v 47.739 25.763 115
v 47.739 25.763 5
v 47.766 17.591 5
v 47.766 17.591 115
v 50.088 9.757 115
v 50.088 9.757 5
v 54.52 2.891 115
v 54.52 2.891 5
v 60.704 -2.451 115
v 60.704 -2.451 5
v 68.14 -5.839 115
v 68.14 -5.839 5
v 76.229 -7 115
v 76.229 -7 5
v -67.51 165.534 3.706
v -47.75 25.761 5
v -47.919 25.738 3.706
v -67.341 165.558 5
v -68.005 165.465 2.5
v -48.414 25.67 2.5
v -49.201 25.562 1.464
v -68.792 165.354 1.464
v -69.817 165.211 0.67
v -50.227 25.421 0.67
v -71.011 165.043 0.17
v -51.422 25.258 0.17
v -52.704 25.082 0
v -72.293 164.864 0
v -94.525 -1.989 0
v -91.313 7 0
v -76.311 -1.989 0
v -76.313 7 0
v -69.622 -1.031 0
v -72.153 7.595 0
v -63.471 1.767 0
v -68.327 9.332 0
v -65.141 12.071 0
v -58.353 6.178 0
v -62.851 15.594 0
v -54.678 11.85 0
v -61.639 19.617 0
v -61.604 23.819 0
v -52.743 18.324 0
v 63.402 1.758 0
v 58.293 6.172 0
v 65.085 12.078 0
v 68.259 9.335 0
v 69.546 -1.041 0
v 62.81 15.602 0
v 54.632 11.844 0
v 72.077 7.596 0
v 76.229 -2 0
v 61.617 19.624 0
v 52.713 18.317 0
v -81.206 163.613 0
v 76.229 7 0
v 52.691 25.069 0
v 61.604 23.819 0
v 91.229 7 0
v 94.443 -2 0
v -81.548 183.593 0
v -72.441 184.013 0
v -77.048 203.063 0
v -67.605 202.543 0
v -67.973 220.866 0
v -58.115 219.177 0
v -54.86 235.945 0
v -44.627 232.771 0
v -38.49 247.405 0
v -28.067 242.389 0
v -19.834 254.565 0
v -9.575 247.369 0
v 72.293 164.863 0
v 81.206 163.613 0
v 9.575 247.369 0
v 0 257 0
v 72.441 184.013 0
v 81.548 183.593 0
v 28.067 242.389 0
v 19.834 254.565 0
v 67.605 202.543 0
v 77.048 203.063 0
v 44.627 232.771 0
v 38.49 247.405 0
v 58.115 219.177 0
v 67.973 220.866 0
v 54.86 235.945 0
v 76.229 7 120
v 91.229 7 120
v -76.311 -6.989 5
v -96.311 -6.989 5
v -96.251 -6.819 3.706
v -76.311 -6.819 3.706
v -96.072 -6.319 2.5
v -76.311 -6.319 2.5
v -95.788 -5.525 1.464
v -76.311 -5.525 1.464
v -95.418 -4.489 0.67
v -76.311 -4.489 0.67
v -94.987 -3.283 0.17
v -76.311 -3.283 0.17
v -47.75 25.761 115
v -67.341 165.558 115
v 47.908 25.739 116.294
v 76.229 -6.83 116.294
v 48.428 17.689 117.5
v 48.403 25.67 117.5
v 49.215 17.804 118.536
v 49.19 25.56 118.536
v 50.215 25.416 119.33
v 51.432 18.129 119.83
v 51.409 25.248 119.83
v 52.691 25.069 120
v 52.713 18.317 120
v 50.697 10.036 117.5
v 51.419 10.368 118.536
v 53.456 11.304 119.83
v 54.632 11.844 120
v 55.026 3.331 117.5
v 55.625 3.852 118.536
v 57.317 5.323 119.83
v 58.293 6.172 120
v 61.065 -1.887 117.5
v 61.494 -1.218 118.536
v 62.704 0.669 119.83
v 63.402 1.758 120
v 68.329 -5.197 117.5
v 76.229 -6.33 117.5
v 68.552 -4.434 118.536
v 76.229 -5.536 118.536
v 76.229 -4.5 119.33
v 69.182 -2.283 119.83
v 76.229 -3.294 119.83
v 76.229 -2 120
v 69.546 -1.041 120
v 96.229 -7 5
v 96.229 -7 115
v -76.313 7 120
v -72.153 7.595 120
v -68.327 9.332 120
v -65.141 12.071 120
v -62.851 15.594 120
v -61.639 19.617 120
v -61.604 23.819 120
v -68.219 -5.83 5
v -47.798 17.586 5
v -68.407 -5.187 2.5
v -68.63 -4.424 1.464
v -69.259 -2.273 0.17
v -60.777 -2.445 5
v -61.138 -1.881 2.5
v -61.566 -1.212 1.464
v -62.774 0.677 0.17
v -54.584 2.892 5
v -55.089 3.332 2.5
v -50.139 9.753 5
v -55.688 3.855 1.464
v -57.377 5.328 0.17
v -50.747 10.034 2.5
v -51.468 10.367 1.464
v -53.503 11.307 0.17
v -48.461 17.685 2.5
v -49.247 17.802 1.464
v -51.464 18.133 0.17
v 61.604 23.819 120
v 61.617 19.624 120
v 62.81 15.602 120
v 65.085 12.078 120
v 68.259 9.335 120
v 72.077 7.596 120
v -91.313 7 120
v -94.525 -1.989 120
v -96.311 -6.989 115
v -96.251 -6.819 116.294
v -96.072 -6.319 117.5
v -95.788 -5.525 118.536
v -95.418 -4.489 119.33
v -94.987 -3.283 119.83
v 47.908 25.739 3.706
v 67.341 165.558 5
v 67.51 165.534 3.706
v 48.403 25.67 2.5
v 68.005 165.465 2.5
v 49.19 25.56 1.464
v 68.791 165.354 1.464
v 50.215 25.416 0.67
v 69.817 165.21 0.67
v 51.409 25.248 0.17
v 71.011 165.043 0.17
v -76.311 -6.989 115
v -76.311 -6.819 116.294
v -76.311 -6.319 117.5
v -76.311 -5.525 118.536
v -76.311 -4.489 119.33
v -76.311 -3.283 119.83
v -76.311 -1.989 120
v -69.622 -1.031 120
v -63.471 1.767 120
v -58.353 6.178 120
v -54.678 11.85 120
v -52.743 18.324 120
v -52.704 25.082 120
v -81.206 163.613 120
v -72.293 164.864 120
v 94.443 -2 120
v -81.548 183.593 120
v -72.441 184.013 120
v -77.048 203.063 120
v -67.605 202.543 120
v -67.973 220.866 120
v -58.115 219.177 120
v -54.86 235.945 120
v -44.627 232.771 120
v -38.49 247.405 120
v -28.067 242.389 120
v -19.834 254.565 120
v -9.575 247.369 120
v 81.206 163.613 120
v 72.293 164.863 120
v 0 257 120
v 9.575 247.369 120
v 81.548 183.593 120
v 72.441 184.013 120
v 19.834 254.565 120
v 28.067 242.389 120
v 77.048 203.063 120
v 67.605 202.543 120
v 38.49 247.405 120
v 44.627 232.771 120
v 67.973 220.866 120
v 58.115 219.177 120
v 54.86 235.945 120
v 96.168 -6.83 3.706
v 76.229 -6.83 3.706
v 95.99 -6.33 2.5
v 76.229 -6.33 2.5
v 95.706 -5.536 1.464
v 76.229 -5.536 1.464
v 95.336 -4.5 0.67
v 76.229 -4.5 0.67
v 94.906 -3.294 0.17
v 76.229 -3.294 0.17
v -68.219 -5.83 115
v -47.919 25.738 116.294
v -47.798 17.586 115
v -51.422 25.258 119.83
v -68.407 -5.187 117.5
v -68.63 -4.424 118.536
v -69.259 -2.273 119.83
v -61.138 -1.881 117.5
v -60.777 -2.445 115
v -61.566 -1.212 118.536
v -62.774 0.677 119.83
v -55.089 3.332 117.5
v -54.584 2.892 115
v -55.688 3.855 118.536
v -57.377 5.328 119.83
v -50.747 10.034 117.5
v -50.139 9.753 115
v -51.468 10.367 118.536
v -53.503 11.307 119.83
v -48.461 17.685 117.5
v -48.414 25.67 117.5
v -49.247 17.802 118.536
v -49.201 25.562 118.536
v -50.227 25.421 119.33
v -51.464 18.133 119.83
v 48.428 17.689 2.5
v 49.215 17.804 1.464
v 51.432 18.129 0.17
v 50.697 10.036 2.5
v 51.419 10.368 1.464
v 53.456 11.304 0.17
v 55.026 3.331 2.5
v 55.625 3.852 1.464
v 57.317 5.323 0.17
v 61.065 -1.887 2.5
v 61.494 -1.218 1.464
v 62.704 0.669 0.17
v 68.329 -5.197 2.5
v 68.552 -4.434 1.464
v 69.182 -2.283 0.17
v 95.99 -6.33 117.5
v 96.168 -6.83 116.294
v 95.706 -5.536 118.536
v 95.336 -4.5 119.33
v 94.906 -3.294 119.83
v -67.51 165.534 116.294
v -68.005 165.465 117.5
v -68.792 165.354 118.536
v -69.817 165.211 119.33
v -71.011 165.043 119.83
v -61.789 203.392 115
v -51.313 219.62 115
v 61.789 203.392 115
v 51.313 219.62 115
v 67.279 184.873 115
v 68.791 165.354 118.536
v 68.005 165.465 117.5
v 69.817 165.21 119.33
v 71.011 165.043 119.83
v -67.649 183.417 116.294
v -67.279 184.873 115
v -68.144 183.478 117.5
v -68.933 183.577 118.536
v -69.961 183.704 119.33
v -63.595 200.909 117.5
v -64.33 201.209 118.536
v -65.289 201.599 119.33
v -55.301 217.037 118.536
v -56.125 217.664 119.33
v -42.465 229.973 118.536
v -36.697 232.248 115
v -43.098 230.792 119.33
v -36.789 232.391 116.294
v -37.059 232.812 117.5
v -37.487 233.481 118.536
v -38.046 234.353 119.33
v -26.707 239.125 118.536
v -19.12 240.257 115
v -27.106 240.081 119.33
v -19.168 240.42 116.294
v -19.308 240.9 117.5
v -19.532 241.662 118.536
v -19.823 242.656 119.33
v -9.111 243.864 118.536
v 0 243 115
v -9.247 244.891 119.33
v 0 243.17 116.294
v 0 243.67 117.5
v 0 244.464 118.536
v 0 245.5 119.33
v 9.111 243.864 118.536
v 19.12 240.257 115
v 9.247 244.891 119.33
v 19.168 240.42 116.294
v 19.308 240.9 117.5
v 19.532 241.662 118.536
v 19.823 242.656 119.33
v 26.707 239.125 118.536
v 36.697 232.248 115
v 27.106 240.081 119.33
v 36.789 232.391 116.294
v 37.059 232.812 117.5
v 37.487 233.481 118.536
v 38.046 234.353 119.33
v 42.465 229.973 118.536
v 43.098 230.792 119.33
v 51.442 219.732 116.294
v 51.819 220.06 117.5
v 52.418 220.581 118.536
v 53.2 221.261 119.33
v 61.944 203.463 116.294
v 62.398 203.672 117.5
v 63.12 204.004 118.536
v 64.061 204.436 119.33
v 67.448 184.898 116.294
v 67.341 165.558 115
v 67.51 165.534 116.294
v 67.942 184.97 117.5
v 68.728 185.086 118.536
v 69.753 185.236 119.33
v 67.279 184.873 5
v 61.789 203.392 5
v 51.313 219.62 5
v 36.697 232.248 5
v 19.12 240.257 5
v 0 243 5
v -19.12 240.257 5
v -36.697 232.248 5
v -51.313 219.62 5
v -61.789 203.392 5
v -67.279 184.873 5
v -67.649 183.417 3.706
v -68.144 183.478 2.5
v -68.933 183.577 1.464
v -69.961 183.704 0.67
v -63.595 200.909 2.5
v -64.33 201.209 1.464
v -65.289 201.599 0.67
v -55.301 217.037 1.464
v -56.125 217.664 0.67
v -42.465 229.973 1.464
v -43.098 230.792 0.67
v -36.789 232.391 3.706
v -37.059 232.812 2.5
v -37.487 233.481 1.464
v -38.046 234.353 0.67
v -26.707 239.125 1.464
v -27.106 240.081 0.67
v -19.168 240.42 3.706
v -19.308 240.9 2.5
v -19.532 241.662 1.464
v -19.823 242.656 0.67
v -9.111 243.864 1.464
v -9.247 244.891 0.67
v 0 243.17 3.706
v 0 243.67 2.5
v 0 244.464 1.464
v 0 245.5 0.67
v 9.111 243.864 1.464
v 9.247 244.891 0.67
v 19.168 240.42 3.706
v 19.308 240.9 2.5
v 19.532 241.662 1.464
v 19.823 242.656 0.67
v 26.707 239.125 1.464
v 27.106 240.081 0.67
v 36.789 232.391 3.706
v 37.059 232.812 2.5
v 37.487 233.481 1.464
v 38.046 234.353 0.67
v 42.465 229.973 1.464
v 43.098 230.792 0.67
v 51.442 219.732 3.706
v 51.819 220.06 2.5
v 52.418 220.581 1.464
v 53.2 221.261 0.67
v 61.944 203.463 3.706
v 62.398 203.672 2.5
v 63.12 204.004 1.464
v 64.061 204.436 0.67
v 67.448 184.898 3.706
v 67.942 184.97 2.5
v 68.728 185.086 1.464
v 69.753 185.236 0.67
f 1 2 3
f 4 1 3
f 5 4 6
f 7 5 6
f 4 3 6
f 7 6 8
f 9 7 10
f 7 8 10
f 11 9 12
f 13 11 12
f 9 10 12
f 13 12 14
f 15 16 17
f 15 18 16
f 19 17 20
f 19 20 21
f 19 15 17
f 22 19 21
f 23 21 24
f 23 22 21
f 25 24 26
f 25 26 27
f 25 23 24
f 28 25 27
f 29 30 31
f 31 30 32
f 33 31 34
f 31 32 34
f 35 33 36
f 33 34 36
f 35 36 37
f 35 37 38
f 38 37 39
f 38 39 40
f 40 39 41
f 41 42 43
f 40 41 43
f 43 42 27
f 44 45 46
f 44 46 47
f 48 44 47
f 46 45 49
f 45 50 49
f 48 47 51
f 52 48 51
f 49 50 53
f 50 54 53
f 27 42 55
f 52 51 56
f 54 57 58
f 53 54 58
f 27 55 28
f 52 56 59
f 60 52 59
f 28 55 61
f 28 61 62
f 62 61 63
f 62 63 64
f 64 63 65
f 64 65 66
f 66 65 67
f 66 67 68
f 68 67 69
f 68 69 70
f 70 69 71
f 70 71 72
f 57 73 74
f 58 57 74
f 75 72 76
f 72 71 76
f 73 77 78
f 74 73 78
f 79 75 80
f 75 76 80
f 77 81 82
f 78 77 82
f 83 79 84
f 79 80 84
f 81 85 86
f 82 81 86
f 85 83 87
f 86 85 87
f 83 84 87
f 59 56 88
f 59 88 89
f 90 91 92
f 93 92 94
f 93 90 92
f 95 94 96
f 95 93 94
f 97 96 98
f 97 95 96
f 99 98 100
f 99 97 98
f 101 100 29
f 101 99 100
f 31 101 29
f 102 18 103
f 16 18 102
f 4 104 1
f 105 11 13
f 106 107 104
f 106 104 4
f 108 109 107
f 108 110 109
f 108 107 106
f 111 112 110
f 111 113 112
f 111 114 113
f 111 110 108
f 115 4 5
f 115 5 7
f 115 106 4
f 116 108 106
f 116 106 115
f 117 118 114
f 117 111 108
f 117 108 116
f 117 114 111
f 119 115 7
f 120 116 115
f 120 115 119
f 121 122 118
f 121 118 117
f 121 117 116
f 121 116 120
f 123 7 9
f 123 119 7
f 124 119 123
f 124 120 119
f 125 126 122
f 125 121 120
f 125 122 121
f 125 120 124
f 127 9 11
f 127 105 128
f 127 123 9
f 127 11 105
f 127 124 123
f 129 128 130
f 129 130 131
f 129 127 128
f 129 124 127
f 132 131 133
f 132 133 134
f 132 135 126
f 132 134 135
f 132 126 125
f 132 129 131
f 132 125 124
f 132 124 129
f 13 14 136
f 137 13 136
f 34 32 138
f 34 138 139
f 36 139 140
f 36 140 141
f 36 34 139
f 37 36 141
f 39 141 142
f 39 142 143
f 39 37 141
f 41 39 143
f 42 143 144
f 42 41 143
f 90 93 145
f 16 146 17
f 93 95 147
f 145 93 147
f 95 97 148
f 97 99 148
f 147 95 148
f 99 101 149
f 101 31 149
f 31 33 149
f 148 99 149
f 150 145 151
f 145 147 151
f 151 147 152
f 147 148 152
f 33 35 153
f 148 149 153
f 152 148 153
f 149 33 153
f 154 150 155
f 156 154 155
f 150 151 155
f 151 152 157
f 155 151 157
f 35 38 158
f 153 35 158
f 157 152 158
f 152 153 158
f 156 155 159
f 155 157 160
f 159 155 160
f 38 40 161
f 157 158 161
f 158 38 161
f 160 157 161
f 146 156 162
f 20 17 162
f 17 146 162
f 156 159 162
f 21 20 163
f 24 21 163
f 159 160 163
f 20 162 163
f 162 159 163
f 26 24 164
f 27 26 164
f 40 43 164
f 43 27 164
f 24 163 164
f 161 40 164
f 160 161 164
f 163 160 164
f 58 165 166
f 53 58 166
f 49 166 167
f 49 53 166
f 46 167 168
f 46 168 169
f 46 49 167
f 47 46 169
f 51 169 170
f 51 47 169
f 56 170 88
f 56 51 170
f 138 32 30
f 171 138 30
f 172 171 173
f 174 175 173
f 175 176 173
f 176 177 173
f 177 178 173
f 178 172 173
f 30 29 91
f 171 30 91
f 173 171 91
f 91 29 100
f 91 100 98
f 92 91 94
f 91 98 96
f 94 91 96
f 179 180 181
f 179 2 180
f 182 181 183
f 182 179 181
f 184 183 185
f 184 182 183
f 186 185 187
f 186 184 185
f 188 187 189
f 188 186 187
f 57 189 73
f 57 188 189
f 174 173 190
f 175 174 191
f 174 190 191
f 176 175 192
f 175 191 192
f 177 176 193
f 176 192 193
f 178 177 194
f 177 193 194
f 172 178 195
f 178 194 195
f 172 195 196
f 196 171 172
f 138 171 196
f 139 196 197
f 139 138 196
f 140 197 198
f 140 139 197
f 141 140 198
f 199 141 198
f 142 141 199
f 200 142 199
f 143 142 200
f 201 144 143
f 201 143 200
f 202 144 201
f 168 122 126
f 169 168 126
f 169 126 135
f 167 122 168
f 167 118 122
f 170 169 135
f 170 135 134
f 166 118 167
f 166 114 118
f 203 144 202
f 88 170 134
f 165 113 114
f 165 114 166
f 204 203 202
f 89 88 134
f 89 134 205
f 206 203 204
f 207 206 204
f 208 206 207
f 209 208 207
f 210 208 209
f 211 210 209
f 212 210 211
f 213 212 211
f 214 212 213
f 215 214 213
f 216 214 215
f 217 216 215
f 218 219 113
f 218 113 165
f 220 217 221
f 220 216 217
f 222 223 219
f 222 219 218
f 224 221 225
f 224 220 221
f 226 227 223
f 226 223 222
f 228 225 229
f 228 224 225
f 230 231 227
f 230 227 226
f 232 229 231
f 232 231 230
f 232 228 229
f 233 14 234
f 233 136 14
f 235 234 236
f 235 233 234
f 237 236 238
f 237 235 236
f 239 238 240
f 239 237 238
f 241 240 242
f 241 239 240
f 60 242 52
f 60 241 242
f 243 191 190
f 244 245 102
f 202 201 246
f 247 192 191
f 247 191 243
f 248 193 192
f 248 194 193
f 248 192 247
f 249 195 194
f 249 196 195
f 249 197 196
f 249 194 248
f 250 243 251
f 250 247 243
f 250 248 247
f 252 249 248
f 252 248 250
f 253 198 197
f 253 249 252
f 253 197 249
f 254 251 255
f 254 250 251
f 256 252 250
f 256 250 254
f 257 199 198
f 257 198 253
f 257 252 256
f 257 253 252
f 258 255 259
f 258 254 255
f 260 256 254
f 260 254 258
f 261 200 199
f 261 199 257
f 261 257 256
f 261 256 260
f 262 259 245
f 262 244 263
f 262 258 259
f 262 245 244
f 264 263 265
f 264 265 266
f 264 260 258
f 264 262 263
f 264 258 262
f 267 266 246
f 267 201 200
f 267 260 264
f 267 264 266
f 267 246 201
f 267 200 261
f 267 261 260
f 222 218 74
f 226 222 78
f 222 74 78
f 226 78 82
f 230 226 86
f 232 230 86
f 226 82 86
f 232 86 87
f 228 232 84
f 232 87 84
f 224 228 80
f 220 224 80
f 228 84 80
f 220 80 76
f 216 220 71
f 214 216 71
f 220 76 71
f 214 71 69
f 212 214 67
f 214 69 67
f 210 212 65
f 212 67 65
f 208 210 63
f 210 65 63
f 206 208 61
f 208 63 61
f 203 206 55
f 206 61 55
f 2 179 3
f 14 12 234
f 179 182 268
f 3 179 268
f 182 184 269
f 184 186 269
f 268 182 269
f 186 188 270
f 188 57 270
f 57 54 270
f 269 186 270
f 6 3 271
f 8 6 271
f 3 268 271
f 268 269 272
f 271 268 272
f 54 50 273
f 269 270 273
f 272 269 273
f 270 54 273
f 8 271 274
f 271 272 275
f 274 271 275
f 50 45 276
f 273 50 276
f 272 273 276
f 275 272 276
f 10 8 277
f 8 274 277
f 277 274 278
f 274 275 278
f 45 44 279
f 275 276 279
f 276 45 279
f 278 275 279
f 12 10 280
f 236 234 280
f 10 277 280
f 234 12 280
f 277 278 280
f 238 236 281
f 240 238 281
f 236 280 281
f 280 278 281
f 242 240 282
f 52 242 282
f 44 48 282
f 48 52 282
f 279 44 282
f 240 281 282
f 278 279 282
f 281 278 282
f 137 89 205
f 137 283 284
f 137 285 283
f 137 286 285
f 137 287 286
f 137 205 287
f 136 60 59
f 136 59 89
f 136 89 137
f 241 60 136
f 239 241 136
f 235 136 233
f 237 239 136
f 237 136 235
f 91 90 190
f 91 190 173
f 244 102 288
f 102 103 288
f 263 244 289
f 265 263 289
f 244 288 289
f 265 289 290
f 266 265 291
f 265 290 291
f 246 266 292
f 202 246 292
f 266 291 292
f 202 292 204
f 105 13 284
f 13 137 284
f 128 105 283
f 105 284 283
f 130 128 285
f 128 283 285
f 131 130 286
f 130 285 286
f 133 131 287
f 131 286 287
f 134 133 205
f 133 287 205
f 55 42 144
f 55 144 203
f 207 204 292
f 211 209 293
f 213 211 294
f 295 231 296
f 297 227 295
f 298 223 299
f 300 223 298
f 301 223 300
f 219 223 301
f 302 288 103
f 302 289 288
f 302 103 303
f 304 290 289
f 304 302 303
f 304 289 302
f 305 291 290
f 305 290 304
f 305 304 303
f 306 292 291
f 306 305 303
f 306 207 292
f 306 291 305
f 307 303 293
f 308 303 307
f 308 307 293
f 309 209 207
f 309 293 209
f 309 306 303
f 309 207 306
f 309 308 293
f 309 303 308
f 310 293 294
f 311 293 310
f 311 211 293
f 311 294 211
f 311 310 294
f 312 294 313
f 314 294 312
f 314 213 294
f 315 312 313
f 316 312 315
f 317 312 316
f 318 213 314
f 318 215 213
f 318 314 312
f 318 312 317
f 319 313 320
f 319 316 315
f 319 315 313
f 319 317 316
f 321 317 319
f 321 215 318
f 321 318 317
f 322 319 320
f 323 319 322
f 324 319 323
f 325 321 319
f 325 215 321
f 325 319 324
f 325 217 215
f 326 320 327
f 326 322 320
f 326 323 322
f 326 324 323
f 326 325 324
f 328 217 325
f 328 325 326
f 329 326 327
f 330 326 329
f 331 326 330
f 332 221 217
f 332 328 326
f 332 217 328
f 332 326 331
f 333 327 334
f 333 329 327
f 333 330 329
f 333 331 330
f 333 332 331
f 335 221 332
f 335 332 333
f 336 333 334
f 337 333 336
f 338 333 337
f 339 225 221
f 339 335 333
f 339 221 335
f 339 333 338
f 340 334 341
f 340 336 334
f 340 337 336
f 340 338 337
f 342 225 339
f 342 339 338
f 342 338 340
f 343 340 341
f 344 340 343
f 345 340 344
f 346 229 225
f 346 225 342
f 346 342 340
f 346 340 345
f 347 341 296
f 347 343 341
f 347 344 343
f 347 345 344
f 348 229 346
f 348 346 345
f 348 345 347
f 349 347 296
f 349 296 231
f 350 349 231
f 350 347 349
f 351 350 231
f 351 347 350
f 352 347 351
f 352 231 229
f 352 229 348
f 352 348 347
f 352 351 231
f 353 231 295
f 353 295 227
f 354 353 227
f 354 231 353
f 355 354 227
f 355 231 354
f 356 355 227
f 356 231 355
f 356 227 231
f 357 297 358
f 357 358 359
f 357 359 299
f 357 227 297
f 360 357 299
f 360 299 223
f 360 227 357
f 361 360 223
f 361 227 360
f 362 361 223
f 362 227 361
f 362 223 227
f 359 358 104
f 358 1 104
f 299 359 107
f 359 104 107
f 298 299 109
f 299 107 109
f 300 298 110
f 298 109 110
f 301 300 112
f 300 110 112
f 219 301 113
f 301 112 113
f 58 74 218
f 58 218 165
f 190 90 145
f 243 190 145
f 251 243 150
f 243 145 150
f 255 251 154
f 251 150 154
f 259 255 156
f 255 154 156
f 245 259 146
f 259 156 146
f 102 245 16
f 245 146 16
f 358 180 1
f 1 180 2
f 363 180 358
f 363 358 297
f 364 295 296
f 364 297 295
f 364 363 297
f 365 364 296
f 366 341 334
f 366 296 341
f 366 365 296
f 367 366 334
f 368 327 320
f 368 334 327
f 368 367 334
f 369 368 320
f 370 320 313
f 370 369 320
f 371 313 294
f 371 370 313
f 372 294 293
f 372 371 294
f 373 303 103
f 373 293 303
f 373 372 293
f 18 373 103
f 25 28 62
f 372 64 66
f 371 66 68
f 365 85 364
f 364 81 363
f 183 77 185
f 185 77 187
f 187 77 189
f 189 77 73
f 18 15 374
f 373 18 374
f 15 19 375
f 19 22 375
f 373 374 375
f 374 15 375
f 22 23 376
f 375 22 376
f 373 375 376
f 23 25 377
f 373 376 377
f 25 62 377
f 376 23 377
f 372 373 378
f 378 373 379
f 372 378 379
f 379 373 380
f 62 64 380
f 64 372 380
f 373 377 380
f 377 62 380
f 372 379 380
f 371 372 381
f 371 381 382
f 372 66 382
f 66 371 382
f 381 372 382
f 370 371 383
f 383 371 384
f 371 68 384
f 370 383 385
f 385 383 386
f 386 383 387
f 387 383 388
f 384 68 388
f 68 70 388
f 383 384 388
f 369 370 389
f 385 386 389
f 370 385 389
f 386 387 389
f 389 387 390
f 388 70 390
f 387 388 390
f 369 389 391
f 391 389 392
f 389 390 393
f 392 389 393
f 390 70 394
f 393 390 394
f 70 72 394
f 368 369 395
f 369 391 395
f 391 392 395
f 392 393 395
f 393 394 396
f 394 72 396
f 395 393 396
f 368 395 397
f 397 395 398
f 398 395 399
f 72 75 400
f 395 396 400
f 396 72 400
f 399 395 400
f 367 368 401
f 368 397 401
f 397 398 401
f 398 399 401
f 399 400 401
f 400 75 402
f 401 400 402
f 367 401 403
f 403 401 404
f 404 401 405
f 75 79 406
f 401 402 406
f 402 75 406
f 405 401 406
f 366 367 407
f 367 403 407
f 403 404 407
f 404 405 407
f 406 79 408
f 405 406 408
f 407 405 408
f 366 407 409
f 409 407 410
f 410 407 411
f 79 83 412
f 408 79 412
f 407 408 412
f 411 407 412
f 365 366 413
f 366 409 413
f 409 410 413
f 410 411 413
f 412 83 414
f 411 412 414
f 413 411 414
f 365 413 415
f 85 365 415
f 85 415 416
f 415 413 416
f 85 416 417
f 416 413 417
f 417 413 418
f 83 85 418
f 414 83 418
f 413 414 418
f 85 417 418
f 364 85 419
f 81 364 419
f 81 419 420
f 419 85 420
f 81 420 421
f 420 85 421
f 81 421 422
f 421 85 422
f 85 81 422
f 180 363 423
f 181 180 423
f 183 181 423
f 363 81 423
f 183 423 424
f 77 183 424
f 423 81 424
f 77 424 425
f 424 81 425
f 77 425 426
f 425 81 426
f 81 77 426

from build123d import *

# Parameters (mm, degrees)
PAD_DEPTH = 120
FILLET_R  = 5


with BuildPart() as part:
    # Sketch → Pad (new body)
    with BuildSketch(Plane.XY):
        with BuildLine():
            ThreePointArc((81.205589, 163.61348), (0, 257.000003), (-81.205589, 163.61348))
            Line((-61.604044, 23.818887), (-81.205589, 163.61348))
            ThreePointArc((-76.312668, 7), (-65.141068, 12.07111), (-61.604044, 23.818887))
            Line((-76.312668, 7), (-91.312668, 7))
            Line((-91.312668, 7), (-96.311409, -6.989133))
            Line((-76.311409, -6.989133), (-96.311409, -6.989133))
            ThreePointArc((-76.311409, -6.989133), (-54.584345, 2.892207), (-47.750327, 25.761451))
            Line((-67.341217, 165.557526), (-47.750327, 25.761451))
            ThreePointArc((67.341217, 165.557526), (0, 243.000004), (-67.341217, 165.557526))
            Line((67.341217, 165.557526), (47.739445, 25.762956))
            ThreePointArc((47.739445, 25.762956), (54.520356, 2.891123), (76.229044, -6.999999))
            Line((76.229044, -6.999999), (96.229044, -6.999999))
            Line((91.229042, 7.000001), (96.229044, -6.999999))
            Line((76.229042, 7.000001), (91.229042, 7.000001))
            ThreePointArc((61.603815, 23.818922), (65.084835, 12.077624), (76.229042, 7.000001))
            Line((81.205589, 163.61348), (61.603815, 23.818922))
        make_face()
    extrude(amount=PAD_DEPTH)

    # Fillet
    fillet_edges = [part.edges().sort_by_distance(p)[0] for p in [
        (54.520356, 2.891123, 0),
        (86.229044, -6.999999, 0),
        (86.229044, -6.999999, 120),
        (54.520356, 2.891123, 120),
        (57.540331, 95.660241, 0),
        (0, 243.000004, 0),
        (0, 243.000004, 120),
        (-57.545772, 95.659489, 0),
        (-54.584345, 2.892207, 0),
        (-86.311409, -6.989133, 0),
        (-86.311409, -6.989133, 120),
        (-54.584345, 2.892207, 120),
        (-57.545772, 95.659489, 120),
        (57.540331, 95.660241, 120),
    ]]
    fillet(fillet_edges, radius=FILLET_R)


solid = part.part
